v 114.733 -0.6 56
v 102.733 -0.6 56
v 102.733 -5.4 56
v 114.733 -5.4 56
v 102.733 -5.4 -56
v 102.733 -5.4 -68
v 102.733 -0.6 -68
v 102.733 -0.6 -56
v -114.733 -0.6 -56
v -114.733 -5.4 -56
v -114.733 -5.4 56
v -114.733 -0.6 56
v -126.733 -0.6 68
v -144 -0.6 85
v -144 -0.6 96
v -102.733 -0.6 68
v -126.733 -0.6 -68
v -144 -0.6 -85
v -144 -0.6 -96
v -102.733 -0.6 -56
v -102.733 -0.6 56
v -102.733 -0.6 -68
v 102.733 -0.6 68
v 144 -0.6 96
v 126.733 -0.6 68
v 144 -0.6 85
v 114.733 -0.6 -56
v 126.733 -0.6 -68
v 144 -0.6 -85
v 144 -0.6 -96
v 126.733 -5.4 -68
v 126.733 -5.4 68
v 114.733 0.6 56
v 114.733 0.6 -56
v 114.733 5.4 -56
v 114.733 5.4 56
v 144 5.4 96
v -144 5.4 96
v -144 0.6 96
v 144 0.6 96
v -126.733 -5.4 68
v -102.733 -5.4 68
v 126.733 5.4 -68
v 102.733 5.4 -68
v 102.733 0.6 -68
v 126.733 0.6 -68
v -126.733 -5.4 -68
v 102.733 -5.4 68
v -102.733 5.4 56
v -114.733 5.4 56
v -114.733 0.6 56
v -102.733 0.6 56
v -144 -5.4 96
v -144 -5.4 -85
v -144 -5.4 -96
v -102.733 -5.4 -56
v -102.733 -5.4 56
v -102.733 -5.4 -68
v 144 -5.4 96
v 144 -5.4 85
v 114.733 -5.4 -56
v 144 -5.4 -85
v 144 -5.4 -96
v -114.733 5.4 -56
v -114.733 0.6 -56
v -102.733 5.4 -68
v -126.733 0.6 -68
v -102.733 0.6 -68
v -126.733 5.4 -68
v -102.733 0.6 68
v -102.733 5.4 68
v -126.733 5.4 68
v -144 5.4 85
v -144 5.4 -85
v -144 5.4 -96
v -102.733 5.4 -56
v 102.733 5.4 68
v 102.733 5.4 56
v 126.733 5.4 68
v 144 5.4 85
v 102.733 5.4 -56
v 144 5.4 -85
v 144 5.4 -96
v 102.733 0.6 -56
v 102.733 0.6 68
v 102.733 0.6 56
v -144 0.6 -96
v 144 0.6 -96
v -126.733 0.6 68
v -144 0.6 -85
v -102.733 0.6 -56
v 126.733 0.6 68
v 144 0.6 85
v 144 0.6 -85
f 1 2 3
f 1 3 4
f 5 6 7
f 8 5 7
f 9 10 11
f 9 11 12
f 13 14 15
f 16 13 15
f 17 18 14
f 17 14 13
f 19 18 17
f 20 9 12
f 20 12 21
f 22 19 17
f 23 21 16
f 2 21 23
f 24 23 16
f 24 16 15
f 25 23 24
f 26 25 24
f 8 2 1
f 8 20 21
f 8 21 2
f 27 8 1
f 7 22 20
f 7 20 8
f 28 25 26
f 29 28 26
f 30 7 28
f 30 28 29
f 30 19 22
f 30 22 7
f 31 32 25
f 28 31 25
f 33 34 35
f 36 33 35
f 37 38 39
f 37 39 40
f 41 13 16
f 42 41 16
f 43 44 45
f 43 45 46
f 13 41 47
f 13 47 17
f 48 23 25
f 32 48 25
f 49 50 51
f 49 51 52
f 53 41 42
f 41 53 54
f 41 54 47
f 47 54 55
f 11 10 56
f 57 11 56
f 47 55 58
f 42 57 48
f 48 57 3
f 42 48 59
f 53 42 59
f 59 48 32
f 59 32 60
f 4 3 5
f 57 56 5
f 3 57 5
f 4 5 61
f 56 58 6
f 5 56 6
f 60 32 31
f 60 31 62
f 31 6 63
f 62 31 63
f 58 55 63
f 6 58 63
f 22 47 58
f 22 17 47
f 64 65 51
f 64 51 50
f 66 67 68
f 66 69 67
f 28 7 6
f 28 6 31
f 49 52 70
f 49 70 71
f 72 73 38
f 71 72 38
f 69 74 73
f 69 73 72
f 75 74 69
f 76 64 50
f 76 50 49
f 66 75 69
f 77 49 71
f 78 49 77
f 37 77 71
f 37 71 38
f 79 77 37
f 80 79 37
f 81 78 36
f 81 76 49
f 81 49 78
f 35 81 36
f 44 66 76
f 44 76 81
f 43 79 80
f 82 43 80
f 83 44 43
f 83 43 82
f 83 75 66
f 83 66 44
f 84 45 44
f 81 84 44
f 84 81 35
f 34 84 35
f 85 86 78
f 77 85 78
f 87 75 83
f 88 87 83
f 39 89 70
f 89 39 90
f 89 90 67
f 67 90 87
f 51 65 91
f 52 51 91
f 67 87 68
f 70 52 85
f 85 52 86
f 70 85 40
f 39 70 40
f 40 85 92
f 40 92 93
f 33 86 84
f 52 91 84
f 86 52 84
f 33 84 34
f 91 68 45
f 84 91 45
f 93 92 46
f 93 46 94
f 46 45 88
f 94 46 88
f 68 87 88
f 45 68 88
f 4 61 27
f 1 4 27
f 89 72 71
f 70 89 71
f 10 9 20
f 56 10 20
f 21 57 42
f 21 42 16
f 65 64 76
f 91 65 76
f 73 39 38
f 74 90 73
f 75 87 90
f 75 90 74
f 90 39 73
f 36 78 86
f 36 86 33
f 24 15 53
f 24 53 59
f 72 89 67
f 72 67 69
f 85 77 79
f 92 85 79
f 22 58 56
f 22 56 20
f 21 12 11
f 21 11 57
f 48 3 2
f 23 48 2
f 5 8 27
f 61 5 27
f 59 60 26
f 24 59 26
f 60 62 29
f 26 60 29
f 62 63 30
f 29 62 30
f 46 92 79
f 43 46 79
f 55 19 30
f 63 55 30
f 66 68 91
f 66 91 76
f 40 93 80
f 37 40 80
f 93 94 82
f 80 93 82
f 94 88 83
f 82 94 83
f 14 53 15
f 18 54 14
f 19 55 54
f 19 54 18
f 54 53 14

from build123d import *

# Parameters (mm, degrees)
SKETCH1_W           = 360
SKETCH1_H           = 240
BOSS_EXTRUDE1_DEPTH = 6
SKETCH1_3_W         = 360
SKETCH1_3_H         = 240
BOSS_EXTRUDE2_DEPTH = 6
SCALE1_START        = -120
SCALE1_OUTLINE_W    = 360
SCALE1_OUTLINE_H    = 12
SCALE1_OUTLINE_W_2  = 288
SCALE1_OUTLINE_H_2  = 4.8
SCALE1_DEPTH        = 240
SCALE1_2_OUTLINE_W  = 288
SCALE1_2_OUTLINE_H  = 4.8
SCALE1_2_DEPTH      = 24
SCALE1_START_2      = 96
SCALE1_3_OUTLINE_W  = 288
SCALE1_3_OUTLINE_H  = 4.8
SCALE1_3_DEPTH      = 24
SCALE1_START_3      = -68
SCALE1_4_OUTLINE_W  = 12
SCALE1_4_OUTLINE_H  = 4.8
SCALE1_4_DEPTH      = 136
SCALE1_5_OUTLINE_W  = 12
SCALE1_5_OUTLINE_H  = 4.8
SCALE1_5_DEPTH      = 12
SCALE1_START_4      = 56
SCALE1_6_OUTLINE_W  = 12
SCALE1_6_OUTLINE_H  = 4.8
SCALE1_6_DEPTH      = 12
SCALE1_START_5      = -85
SCALE1_7_OUTLINE_W  = 15.583612779
SCALE1_7_OUTLINE_H  = 4.8
SCALE1_7_DEPTH      = 170


# Read off the part's stored shape, not the designer's step: Scale1
with BuildPart() as part:
    # Sketch1 → Boss-Extrude1 (new body)
    with BuildSketch(Plane(origin=(0, 0, 0), x_dir=(1, 0, 0), z_dir=(0, 1, 0))):
        Rectangle(SKETCH1_W, SKETCH1_H)
        Polygon((-158.416387221, 85), (-128.416387221, 85), (-128.416387221, 70), (-143.416387221, 70), (-143.416387221, -70), (-128.416387221, -70), (-128.416387221, -85), (-158.416387221, -85), align=None, mode=Mode.SUBTRACT)
        Polygon((128.416387221, -70), (128.416387221, -85), (158.416387221, -85), (158.416387221, 85), (128.416387221, 85), (128.416387221, 70), (143.416387221, 70), (143.416387221, -70), align=None, mode=Mode.SUBTRACT)
    extrude(amount=BOSS_EXTRUDE1_DEPTH)


with BuildPart() as body_2:
    # Sketch1<3> → Boss-Extrude2 (new body)
    with BuildSketch(Plane(origin=(0, 0, 0), x_dir=(1, 0, 0), z_dir=(0, 1, 0))):
        Rectangle(SKETCH1_3_W, SKETCH1_3_H)
        Polygon((-158.416387221, 85), (-128.416387221, 85), (-128.416387221, 70), (-143.416387221, 70), (-143.416387221, -70), (-128.416387221, -70), (-128.416387221, -85), (-158.416387221, -85), align=None, mode=Mode.SUBTRACT)
        Polygon((128.416387221, -70), (128.416387221, -85), (158.416387221, -85), (158.416387221, 85), (128.416387221, 85), (128.416387221, 70), (143.416387221, 70), (143.416387221, -70), align=None, mode=Mode.SUBTRACT)
    extrude(amount=-BOSS_EXTRUDE2_DEPTH)


with BuildPart() as scale1_tool:
    # Scale1 outline → Scale1 (new body)
    with BuildSketch(Plane.XY.offset(SCALE1_START)):
        Rectangle(SCALE1_OUTLINE_W, SCALE1_OUTLINE_H)
        with Locations((0, 3)):
            Rectangle(SCALE1_OUTLINE_W_2, SCALE1_OUTLINE_H_2, mode=Mode.SUBTRACT)
        with Locations((0, -3)):
            Rectangle(SCALE1_OUTLINE_W_2, SCALE1_OUTLINE_H_2, mode=Mode.SUBTRACT)
    extrude(amount=SCALE1_DEPTH)


with BuildPart() as part_1:
    add(part.part)

    # Scale1: cut by scale1_tool
    add(scale1_tool.part, mode=Mode.SUBTRACT)


with BuildPart() as body_2_1:
    add(body_2.part)

    # Scale1: cut by scale1_tool
    add(scale1_tool.part, mode=Mode.SUBTRACT)


with BuildPart() as scale1_2_tool:
    # Scale1 2 outline → Scale1 2 (new body)
    with BuildSketch(Plane.XY.offset(SCALE1_START)):
        with Locations((0, 3)):
            Rectangle(SCALE1_2_OUTLINE_W, SCALE1_2_OUTLINE_H)
        with Locations((0, -3)):
            Rectangle(SCALE1_2_OUTLINE_W, SCALE1_2_OUTLINE_H)
    extrude(amount=SCALE1_2_DEPTH)


with BuildPart() as part_2:
    add(part_1.part)

    # Scale1 2: cut by scale1_2_tool
    add(scale1_2_tool.part, mode=Mode.SUBTRACT)


with BuildPart() as body_2_2:
    add(body_2_1.part)

    # Scale1 2: cut by scale1_2_tool
    add(scale1_2_tool.part, mode=Mode.SUBTRACT)


with BuildPart() as scale1_3_tool:
    # Scale1 3 outline → Scale1 3 (new body)
    with BuildSketch(Plane.XY.offset(SCALE1_START_2)):
        with Locations((0, 3)):
            Rectangle(SCALE1_3_OUTLINE_W, SCALE1_3_OUTLINE_H)
        with Locations((0, -3)):
            Rectangle(SCALE1_3_OUTLINE_W, SCALE1_3_OUTLINE_H)
    extrude(amount=SCALE1_3_DEPTH)


with BuildPart() as part_3:
    add(part_2.part)

    # Scale1 3: cut by scale1_3_tool
    add(scale1_3_tool.part, mode=Mode.SUBTRACT)


with BuildPart() as body_2_3:
    add(body_2_2.part)

    # Scale1 3: cut by scale1_3_tool
    add(scale1_3_tool.part, mode=Mode.SUBTRACT)


with BuildPart() as scale1_4_tool:
    # Scale1 4 outline → Scale1 4 (new body)
    with BuildSketch(Plane.XY.offset(SCALE1_START_3)):
        with Locations((-120.733109777, 3)):
            Rectangle(SCALE1_4_OUTLINE_W, SCALE1_4_OUTLINE_H)
        with Locations((120.733109777, 3)):
            Rectangle(SCALE1_4_OUTLINE_W, SCALE1_4_OUTLINE_H)
        with Locations((-120.733109777, -3)):
            Rectangle(SCALE1_4_OUTLINE_W, SCALE1_4_OUTLINE_H)
        with Locations((120.733109777, -3)):
            Rectangle(SCALE1_4_OUTLINE_W, SCALE1_4_OUTLINE_H)
    extrude(amount=SCALE1_4_DEPTH)


with BuildPart() as part_4:
    add(part_3.part)

    # Scale1 4: cut by scale1_4_tool
    add(scale1_4_tool.part, mode=Mode.SUBTRACT)


with BuildPart() as body_2_4:
    add(body_2_3.part)

    # Scale1 4: cut by scale1_4_tool
    add(scale1_4_tool.part, mode=Mode.SUBTRACT)


with BuildPart() as scale1_5_tool:
    # Scale1 5 outline → Scale1 5 (new body)
    with BuildSketch(Plane.XY.offset(SCALE1_START_3)):
        with Locations((-108.733109777, 3)):
            Rectangle(SCALE1_5_OUTLINE_W, SCALE1_5_OUTLINE_H)
        with Locations((108.733109777, 3)):
            Rectangle(SCALE1_5_OUTLINE_W, SCALE1_5_OUTLINE_H)
        with Locations((-108.733109777, -3)):
            Rectangle(SCALE1_5_OUTLINE_W, SCALE1_5_OUTLINE_H)
        with Locations((108.733109777, -3)):
            Rectangle(SCALE1_5_OUTLINE_W, SCALE1_5_OUTLINE_H)
    extrude(amount=SCALE1_5_DEPTH)


with BuildPart() as part_5:
    add(part_4.part)

    # Scale1 5: cut by scale1_5_tool
    add(scale1_5_tool.part, mode=Mode.SUBTRACT)


with BuildPart() as body_2_5:
    add(body_2_4.part)

    # Scale1 5: cut by scale1_5_tool
    add(scale1_5_tool.part, mode=Mode.SUBTRACT)


with BuildPart() as scale1_6_tool:
    # Scale1 6 outline → Scale1 6 (new body)
    with BuildSketch(Plane.XY.offset(SCALE1_START_4)):
        with Locations((-108.733109777, 3)):
            Rectangle(SCALE1_6_OUTLINE_W, SCALE1_6_OUTLINE_H)
        with Locations((108.733109777, 3)):
            Rectangle(SCALE1_6_OUTLINE_W, SCALE1_6_OUTLINE_H)
        with Locations((-108.733109777, -3)):
            Rectangle(SCALE1_6_OUTLINE_W, SCALE1_6_OUTLINE_H)
        with Locations((108.733109777, -3)):
            Rectangle(SCALE1_6_OUTLINE_W, SCALE1_6_OUTLINE_H)
    extrude(amount=SCALE1_6_DEPTH)


with BuildPart() as part_6:
    add(part_5.part)

    # Scale1 6: cut by scale1_6_tool
    add(scale1_6_tool.part, mode=Mode.SUBTRACT)



with BuildPart() as body_2_6:
    add(body_2_5.part)

    # Scale1 6: cut by scale1_6_tool
    add(scale1_6_tool.part, mode=Mode.SUBTRACT)


with BuildPart() as part_7:
    add(part_6.part)

    add(body_2_6.part)  # Scale1 7 merges body 2
    # Scale1 7 outline → Scale1 7 (add)
    with BuildSketch(Plane.XY.offset(SCALE1_START_5)):
        with Locations((-136.208193611, 3)):
            Rectangle(SCALE1_7_OUTLINE_W, SCALE1_7_OUTLINE_H)
        with Locations((136.208193611, 3)):
            Rectangle(SCALE1_7_OUTLINE_W, SCALE1_7_OUTLINE_H)
        with Locations((-136.208193611, -3)):
            Rectangle(SCALE1_7_OUTLINE_W, SCALE1_7_OUTLINE_H)
        with Locations((136.208193611, -3)):
            Rectangle(SCALE1_7_OUTLINE_W, SCALE1_7_OUTLINE_H)
    extrude(amount=SCALE1_7_DEPTH)


solid = part_7.part
